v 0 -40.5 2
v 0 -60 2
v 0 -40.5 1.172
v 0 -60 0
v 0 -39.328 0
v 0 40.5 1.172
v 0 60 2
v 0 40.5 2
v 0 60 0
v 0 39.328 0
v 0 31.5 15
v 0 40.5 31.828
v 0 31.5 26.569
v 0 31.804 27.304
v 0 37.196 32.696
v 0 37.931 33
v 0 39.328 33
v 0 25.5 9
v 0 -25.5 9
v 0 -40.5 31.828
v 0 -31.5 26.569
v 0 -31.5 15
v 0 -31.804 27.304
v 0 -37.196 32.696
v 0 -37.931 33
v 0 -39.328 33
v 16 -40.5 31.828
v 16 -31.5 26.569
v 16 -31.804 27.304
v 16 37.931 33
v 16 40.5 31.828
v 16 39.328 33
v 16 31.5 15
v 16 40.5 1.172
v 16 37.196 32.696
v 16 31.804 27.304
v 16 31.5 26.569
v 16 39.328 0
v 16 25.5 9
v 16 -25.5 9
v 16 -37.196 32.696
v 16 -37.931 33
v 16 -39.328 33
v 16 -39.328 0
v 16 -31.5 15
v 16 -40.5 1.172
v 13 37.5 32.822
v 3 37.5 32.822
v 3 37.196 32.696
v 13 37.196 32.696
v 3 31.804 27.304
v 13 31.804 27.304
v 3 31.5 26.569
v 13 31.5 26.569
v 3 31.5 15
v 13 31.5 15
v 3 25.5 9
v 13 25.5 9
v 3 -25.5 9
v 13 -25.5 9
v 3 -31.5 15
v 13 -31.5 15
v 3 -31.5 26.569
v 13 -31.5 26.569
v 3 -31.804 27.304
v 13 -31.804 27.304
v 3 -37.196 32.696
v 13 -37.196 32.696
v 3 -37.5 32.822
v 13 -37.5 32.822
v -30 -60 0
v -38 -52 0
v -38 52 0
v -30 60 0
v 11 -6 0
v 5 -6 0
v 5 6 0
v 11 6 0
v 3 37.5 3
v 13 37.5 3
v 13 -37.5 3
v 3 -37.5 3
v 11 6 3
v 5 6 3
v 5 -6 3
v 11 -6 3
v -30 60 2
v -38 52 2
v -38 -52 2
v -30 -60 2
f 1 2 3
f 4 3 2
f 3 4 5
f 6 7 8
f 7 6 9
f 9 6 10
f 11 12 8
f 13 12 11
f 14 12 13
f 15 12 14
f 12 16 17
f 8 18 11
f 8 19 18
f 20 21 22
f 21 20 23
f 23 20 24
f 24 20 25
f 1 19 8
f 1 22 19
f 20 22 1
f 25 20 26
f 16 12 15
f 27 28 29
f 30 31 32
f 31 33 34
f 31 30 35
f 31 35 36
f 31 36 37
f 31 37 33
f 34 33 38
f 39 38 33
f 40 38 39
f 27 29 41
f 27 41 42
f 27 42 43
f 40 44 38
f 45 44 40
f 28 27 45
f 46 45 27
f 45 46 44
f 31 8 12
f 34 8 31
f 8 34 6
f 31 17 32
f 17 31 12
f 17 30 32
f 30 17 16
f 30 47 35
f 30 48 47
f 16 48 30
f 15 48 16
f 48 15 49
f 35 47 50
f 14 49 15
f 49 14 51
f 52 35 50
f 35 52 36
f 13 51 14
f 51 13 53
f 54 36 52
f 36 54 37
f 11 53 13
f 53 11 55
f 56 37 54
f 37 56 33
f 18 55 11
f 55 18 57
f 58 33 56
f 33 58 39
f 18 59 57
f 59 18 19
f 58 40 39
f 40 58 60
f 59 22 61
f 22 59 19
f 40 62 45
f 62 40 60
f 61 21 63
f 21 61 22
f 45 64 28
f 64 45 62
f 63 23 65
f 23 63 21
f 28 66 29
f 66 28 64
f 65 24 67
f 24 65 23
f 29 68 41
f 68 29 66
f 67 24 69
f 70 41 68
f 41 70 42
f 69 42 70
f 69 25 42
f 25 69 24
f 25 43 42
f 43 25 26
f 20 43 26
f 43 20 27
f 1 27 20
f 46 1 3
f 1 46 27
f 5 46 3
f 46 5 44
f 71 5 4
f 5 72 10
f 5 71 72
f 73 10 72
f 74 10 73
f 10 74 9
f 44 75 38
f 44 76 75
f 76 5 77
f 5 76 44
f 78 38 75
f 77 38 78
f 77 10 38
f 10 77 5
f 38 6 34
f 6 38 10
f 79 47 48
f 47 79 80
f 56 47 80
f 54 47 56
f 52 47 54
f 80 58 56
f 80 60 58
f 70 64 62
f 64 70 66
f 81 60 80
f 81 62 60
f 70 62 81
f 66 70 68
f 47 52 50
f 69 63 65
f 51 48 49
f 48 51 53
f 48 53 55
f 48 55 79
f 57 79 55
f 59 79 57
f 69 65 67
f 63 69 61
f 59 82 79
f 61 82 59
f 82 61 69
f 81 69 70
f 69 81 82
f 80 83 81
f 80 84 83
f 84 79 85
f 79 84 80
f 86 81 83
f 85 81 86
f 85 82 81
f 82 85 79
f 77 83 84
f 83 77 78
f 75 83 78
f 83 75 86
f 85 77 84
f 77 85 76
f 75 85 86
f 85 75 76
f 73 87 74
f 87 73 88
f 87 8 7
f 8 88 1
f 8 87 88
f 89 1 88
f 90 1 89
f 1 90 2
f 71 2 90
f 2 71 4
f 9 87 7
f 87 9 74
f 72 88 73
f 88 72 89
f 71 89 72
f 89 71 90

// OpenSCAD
// CD tray mount for cell phone

// Author: Philippe Vanhaesendonck
// License: CC BY-NC-SA
// Based on original work from:
//  http://www.thingiverse.com/thing:644402


// OpenSCAD stuff
delta       = 0.1;    // Small delta used for differences
offset      = 1.0;    // Bigger offset
$fa         = 3;      // Min segment angle for facets
$fs         = 0.5;    // Min segment size

// Cell phone size (Nexus 4)
g_l = 75;            // Length
g_h = 30;            // Height 
g_w = 10;             // Width
g_u = 25;             // Heigth of the USB hole

h_w = 3;              // Wall thickness
h_b = 6;              // 'Border' size

// Holder design -- polygon points
p_holder = [
  [-g_l / 2 - h_w    , 0],
  [ g_l / 2 + h_w    , 0],
  [ g_l / 2 + h_w    , g_h + h_w],
  [ g_l / 2          , g_h + h_w],
  [ g_l / 2 - h_b    , g_h + h_w - h_b],
  [ g_l / 2 - h_b    , 2 * h_b + h_w],
  [ g_l / 2 - 2 * h_b, h_b + h_w],
  [-g_l / 2 + 2 * h_b, h_b + h_w],
  [-g_l / 2 + h_b    , 2 * h_b + h_w],
  [-g_l / 2 + h_b    , g_h + h_w - h_b],
  [-g_l / 2          , g_h + h_w],
  [-g_l / 2 - h_w    , g_h + h_w]  
];

// CD insert size
cd_l = 120;           // Length (width)
cd_h = 38;            // Height (depth)
cd_c = 8;             // Chamfer (at the end)
cd_w = 2;             // Width

// Polygon for the insert
p_cd = [
  [0           , -cd_l / 2],
  [-cd_h + cd_c, -cd_l / 2],
  [-cd_h       , -cd_l / 2 + cd_c],
  [-cd_h       ,  cd_l / 2 - cd_c],
  [-cd_h + cd_c,  cd_l / 2],
  [0           ,  cd_l / 2]  
];

// Draw holder
module holder() {
  difference() {
    // Holder 'volume'
    linear_extrude(height = g_w + 2 * h_w, convexity = 5)
      offset(delta=2, chamfer=true) 
        offset(delta=-2) 
          polygon(points = p_holder,
            paths = [
              [0, 1, 2, 3, 4, 5, 6, 7, 8, 9, 10, 11]
            ]);
    // Phone 'pocket'
    translate([-g_l / 2, h_w, h_w])
      cube([g_l, g_h, g_w]);
    // USB clearance
    /* translate([g_l / 2 - delta, h_w + g_u, h_w]) */
    /*   cube([h_w + delta * 2, g_h, g_w]); */

    translate([-6, -h_w, g_w/2])
         cube([12, h_w*3, 6]);
  }
}


// Draw insert
module cd_insert() {
  linear_extrude(height = cd_w, convexity = 3)
    polygon(points = p_cd,
      paths = [
        [0, 1, 2, 3, 4, 5, 6]
      ]);
}


// Draw all parts
rotate([90, 0, 90])
  holder();
cd_insert();
